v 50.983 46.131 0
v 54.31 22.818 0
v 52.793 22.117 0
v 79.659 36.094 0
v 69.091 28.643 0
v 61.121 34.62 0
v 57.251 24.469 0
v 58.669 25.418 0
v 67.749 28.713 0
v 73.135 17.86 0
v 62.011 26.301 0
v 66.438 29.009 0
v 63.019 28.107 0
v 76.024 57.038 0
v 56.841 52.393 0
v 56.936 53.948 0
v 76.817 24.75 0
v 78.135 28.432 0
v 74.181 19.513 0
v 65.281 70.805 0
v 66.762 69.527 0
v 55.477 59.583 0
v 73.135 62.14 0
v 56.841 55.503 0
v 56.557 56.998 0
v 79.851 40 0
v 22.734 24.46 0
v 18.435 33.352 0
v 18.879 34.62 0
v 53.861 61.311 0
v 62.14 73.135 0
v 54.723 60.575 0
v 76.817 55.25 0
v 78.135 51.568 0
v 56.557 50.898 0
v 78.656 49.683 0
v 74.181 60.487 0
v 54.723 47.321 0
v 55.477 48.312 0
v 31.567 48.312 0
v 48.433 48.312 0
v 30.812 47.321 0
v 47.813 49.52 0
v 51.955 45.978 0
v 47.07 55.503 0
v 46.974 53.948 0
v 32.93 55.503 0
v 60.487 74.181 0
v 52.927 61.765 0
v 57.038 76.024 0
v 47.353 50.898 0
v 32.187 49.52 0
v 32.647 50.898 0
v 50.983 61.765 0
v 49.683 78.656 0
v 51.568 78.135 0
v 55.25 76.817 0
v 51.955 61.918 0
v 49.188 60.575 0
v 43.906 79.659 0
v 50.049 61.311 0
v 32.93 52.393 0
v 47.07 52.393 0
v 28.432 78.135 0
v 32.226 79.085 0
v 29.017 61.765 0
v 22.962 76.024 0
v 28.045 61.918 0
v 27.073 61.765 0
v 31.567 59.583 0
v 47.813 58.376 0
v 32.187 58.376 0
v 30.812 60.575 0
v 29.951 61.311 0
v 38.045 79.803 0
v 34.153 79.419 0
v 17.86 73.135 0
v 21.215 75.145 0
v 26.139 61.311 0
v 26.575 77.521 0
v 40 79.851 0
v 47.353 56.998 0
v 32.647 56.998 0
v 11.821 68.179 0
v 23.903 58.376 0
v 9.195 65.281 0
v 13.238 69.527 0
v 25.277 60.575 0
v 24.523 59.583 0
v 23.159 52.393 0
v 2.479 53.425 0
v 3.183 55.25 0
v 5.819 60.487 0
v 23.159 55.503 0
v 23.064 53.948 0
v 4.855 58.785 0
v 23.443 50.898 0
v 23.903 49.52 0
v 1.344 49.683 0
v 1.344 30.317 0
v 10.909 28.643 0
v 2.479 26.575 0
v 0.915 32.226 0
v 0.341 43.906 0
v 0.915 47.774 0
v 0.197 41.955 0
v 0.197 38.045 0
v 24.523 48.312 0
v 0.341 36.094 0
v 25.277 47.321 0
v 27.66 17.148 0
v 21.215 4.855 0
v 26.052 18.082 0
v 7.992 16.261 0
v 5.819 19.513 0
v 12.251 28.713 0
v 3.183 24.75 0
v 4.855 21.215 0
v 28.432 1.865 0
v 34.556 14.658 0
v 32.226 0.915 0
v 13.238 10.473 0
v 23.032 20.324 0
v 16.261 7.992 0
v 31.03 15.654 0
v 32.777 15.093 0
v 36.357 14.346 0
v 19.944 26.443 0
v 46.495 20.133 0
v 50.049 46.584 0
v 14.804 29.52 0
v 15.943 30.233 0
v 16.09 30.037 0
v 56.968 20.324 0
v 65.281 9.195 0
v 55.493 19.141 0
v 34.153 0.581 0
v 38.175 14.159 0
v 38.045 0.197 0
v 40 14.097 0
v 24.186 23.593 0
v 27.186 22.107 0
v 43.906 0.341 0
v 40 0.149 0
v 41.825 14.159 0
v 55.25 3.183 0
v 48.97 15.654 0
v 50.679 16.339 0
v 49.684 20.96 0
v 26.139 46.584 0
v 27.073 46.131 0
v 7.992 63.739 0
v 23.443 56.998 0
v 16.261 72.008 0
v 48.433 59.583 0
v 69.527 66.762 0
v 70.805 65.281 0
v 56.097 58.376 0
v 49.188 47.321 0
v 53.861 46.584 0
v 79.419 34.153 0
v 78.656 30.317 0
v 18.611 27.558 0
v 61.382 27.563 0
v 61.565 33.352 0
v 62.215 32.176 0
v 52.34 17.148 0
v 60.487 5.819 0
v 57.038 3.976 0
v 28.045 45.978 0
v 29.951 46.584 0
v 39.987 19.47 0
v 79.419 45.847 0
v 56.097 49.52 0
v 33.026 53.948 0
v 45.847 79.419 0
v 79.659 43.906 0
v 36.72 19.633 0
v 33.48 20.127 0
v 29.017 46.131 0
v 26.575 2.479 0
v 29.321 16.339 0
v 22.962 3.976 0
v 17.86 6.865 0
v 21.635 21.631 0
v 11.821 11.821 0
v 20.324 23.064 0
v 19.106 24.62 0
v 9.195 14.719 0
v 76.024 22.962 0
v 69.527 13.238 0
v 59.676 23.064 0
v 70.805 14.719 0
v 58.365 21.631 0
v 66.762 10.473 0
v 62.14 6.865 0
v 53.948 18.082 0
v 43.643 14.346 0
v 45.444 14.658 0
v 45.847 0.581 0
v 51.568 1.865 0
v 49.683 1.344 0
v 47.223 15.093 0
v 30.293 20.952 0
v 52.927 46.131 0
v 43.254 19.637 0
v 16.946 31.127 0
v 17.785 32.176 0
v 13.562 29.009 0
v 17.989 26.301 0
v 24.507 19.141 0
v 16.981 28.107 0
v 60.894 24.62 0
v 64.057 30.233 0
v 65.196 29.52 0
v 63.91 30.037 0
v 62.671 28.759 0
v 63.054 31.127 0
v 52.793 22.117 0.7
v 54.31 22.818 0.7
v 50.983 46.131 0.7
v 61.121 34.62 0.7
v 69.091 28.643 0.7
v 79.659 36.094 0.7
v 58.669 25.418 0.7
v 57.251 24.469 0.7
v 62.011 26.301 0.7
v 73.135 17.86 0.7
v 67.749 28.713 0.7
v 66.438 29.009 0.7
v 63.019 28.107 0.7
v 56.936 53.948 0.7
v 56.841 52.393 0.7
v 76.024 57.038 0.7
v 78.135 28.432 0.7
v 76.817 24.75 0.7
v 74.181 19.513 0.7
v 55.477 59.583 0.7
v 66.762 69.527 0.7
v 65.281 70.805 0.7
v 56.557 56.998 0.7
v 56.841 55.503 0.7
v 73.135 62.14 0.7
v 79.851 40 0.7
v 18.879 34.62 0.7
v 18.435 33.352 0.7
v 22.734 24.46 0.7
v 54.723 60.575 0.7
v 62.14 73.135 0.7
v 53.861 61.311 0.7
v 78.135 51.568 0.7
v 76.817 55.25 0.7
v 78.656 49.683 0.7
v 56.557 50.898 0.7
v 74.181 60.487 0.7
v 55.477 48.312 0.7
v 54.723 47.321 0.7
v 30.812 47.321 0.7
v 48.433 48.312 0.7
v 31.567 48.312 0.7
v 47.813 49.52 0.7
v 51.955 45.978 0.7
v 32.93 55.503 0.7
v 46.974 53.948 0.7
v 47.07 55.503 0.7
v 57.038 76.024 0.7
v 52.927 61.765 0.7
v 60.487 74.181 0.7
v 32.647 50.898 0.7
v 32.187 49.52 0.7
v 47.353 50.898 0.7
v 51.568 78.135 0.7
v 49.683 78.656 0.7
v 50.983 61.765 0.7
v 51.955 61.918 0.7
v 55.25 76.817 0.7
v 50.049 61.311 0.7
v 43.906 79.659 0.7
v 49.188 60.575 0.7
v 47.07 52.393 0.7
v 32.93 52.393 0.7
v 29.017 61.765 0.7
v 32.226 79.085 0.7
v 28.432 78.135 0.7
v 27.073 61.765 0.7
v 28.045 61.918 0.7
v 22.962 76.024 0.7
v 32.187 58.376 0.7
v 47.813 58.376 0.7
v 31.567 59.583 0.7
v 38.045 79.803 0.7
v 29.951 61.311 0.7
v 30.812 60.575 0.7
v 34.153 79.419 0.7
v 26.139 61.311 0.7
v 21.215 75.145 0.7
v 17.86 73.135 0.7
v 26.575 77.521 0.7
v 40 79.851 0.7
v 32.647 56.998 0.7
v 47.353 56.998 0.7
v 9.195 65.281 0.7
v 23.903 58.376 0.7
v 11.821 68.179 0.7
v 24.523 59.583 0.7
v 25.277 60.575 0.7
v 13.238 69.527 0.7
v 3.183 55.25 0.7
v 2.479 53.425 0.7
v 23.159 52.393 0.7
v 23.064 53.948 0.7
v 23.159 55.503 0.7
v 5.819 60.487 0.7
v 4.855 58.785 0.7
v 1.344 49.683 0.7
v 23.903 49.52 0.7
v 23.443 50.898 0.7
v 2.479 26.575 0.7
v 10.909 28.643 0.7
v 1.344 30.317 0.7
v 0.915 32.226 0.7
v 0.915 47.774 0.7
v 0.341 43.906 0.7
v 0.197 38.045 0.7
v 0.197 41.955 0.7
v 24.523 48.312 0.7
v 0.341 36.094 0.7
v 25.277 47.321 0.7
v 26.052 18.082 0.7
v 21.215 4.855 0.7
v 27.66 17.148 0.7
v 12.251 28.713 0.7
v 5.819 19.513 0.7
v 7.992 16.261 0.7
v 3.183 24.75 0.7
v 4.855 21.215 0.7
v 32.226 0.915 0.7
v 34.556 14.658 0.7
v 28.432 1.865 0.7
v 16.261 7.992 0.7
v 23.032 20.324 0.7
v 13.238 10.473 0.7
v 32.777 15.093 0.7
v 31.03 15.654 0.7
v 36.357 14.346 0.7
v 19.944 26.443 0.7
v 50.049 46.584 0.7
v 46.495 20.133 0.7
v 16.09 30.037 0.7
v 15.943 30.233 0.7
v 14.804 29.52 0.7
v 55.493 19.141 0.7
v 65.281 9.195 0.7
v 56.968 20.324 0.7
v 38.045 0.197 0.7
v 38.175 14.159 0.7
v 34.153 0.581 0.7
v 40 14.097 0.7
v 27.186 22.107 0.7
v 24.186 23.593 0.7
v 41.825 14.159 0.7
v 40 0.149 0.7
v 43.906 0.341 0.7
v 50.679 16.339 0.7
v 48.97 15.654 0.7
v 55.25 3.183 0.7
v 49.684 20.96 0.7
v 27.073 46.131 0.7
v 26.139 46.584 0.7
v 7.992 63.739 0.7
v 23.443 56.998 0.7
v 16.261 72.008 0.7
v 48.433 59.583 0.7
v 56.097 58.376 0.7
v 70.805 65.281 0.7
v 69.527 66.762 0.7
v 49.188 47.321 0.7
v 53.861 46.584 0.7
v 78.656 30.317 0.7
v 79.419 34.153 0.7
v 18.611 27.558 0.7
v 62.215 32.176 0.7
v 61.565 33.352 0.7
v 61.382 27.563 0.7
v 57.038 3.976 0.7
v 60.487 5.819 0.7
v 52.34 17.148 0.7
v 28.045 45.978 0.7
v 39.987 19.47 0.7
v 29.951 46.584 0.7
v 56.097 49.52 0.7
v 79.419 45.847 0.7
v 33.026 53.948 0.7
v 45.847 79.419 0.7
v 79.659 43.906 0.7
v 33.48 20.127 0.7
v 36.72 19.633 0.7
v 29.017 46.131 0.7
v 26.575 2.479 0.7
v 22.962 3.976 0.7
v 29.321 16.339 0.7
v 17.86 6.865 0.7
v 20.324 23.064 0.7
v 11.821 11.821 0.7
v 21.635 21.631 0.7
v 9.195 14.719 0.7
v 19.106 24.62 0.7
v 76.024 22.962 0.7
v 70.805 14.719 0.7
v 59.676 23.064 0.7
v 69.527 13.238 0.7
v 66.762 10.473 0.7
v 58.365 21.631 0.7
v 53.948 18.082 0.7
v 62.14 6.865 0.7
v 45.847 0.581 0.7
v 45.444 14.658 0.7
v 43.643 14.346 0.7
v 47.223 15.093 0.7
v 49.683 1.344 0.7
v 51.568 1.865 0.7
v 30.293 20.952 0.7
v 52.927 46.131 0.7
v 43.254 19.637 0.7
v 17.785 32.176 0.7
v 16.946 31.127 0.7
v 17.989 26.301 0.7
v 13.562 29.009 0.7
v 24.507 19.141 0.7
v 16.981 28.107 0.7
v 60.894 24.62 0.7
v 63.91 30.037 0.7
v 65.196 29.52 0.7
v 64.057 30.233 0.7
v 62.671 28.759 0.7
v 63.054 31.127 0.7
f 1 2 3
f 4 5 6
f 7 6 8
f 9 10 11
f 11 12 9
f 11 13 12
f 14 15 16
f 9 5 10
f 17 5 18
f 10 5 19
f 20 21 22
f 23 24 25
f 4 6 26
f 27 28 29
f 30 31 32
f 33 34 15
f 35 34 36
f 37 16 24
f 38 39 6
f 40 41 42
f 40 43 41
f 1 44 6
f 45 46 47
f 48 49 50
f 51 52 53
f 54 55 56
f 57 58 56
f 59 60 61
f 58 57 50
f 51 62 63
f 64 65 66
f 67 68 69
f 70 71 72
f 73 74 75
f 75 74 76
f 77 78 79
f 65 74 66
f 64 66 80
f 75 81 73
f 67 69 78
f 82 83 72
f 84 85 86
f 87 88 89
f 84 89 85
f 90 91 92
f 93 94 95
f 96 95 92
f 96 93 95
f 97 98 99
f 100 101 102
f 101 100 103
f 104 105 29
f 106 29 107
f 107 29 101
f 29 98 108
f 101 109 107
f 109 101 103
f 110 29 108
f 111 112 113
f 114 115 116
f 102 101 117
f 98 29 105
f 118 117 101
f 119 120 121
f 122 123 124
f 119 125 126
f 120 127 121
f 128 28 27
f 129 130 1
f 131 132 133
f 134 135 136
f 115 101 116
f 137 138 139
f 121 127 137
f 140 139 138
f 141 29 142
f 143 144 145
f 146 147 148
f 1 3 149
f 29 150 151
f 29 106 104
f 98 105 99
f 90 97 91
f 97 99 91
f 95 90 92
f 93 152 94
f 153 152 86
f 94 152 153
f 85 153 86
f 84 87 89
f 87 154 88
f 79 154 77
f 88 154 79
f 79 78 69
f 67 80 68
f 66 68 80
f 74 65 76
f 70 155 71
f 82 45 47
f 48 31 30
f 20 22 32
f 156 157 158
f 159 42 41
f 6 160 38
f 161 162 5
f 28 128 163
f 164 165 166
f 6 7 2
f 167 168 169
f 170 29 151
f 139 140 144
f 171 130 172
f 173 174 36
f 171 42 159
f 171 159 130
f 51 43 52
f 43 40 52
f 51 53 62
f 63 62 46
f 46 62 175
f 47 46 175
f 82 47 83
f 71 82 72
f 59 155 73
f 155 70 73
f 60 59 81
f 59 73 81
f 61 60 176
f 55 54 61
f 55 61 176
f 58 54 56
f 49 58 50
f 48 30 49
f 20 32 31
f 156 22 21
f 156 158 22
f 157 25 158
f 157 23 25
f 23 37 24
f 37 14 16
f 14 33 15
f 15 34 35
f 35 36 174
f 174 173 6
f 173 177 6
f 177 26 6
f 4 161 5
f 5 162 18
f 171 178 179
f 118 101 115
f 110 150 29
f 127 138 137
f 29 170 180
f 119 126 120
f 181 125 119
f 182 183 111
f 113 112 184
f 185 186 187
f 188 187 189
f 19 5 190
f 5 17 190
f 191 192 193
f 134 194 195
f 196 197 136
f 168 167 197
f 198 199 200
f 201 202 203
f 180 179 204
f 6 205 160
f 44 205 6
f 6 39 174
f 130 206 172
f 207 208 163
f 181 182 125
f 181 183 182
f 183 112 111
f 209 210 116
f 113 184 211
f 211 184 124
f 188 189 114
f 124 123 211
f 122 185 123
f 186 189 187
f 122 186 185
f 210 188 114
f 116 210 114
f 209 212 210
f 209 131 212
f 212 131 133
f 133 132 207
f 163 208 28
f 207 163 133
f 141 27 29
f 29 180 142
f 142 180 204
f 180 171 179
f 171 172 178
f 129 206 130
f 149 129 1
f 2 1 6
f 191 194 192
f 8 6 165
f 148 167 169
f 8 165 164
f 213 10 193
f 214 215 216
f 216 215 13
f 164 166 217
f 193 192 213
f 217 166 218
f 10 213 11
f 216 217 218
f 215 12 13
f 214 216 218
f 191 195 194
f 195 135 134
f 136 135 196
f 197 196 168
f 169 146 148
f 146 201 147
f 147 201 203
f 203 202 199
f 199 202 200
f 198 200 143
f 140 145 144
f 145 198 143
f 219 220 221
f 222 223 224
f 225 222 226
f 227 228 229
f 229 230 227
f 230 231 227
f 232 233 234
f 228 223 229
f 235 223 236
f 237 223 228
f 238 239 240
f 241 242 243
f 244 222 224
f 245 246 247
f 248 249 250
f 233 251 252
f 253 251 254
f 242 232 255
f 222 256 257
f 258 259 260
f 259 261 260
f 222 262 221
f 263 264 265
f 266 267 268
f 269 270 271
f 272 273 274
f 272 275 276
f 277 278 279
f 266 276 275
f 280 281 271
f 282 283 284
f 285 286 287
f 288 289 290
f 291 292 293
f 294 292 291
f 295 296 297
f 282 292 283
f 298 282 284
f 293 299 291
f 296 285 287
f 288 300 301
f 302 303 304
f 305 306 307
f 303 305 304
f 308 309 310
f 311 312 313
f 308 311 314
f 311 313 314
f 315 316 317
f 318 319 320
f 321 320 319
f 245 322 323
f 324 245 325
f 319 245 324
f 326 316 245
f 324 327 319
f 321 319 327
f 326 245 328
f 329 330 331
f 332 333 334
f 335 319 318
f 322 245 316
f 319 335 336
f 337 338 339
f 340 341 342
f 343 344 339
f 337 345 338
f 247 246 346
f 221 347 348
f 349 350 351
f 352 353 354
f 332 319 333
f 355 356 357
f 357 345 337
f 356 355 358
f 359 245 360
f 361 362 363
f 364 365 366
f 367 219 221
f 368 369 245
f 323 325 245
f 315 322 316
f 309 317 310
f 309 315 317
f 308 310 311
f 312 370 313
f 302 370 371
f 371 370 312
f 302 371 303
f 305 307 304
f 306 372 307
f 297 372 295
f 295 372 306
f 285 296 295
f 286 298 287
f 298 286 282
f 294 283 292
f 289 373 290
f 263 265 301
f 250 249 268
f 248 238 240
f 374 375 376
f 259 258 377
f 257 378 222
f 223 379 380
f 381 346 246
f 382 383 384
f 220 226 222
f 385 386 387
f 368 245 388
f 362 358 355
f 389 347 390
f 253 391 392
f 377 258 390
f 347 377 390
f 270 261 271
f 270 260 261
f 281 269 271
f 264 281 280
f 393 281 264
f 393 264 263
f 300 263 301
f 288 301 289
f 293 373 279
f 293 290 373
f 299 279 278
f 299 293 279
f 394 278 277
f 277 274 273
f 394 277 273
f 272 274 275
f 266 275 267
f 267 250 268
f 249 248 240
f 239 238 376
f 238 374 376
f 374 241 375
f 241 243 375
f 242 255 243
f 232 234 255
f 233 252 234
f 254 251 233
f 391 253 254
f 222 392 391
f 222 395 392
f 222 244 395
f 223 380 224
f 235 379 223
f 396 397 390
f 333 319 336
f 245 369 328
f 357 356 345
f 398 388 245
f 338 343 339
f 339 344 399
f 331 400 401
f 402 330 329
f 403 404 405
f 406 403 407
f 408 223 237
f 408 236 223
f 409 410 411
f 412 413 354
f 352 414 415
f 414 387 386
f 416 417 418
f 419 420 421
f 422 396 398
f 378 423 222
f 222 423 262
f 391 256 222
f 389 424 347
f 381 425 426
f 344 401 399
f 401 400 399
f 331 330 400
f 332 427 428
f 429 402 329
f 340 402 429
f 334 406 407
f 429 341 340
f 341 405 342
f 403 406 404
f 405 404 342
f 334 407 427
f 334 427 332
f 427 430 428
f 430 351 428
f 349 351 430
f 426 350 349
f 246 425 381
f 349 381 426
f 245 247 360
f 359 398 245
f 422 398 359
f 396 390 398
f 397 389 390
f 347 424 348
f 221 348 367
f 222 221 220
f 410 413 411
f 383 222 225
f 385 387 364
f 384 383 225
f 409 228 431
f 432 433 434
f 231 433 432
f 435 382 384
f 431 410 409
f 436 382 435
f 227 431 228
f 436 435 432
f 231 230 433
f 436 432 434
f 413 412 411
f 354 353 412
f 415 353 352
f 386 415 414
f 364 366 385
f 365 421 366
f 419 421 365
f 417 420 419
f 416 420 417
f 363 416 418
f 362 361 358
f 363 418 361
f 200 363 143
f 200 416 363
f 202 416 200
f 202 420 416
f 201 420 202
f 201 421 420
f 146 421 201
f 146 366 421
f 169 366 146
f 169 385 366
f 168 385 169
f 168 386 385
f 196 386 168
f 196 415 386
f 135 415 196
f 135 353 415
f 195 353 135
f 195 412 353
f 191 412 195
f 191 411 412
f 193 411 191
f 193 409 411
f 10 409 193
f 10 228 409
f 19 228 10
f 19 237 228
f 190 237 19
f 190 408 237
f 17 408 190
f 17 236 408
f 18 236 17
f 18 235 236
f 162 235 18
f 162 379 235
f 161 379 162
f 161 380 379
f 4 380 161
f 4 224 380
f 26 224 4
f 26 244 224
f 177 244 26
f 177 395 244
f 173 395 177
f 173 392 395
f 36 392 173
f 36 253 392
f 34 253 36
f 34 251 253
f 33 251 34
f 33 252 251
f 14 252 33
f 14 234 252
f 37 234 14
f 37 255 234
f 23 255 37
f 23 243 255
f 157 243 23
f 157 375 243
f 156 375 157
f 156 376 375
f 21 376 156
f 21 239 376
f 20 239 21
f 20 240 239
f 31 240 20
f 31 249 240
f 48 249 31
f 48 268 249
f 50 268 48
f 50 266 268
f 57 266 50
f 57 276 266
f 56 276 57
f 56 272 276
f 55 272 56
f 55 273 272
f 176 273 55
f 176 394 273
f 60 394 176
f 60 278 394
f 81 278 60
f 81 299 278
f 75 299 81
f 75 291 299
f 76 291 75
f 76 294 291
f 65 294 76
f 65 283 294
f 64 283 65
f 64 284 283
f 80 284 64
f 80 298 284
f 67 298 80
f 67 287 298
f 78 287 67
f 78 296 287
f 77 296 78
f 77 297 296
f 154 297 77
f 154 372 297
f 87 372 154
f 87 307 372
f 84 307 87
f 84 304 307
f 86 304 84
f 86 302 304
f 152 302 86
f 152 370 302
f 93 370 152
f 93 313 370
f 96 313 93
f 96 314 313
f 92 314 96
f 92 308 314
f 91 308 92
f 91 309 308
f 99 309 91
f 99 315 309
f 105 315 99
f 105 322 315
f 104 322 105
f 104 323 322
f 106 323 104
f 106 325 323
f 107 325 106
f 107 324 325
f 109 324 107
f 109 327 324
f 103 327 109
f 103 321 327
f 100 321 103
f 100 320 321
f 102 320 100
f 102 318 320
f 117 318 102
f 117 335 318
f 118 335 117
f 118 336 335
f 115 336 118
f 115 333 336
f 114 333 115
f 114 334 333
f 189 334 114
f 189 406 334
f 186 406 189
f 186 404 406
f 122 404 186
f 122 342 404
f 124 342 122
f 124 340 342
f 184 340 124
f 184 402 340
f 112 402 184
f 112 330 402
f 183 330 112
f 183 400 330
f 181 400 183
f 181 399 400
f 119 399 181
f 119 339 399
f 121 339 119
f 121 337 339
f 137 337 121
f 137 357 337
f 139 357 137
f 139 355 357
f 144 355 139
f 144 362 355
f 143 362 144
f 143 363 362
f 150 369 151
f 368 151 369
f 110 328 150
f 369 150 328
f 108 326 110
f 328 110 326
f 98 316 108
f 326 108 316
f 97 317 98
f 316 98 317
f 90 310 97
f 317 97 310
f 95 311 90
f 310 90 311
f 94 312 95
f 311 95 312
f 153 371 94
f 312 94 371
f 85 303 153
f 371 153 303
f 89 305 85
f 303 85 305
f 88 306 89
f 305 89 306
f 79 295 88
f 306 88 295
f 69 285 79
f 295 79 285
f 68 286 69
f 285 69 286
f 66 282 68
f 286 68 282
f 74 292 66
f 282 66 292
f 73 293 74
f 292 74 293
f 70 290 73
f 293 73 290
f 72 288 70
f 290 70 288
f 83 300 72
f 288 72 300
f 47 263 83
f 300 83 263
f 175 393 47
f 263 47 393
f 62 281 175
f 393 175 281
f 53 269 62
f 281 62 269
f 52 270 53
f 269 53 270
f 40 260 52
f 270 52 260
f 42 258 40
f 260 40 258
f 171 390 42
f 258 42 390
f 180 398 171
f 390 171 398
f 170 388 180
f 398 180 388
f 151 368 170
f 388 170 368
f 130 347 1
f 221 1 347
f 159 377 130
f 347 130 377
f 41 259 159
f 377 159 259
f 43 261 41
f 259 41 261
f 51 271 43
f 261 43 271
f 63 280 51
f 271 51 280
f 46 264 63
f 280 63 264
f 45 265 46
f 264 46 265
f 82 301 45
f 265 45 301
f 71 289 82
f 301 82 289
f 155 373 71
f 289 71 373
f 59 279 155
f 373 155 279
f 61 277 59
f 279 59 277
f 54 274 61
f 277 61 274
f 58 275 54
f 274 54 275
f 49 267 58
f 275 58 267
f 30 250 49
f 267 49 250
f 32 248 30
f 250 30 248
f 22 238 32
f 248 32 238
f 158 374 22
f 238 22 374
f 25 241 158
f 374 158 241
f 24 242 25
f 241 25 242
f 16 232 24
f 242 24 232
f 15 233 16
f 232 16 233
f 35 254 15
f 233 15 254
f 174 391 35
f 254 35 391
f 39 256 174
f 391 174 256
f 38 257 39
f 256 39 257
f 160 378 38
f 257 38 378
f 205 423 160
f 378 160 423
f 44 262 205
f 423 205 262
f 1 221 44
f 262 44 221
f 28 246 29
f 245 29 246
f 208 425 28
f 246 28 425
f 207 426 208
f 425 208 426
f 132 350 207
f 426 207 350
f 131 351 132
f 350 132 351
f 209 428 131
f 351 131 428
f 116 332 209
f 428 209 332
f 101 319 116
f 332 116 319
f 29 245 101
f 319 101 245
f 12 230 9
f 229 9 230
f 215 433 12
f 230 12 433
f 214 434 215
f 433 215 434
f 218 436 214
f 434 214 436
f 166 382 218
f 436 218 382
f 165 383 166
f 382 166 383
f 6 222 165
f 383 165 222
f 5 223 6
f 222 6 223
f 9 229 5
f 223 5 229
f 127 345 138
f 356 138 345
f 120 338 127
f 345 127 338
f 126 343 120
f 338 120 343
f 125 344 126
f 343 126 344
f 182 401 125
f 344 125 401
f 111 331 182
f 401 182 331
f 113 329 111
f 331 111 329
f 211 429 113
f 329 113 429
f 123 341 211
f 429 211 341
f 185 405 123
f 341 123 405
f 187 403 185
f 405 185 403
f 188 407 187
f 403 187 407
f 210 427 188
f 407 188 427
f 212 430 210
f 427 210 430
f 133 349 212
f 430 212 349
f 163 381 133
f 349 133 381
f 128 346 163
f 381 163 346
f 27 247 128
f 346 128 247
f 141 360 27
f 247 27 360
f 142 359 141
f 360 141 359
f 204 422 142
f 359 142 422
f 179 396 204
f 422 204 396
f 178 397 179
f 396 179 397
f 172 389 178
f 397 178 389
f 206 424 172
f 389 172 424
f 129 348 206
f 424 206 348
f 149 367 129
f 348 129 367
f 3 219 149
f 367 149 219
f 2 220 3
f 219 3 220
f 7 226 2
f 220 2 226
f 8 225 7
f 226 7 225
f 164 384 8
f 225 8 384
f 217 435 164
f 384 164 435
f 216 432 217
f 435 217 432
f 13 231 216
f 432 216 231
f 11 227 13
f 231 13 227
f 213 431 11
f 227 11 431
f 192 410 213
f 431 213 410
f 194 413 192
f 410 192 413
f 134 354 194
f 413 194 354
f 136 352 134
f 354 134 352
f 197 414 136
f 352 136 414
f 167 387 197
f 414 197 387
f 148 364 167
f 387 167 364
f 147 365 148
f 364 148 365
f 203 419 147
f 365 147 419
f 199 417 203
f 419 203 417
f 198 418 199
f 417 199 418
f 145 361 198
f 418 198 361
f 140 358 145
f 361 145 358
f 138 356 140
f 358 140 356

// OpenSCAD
stencilHeight = 0.7;
faceSize = 79.65;

module dummy() {}

center_svg_1 = [40.024005174,20.074725186];
center_svg_2 = [40.024005174,20.074725186];
center_svg_3 = [16.089666030,22.067256511];
center_svg_4 = [10.909088961,28.642594902];
center_svg_5 = [65.105854732,28.642594902];
center_svg_6 = [28.044831080,49.962646142];
center_svg_7 = [46.973848537,49.962646142];
// paths for svg_1
points_svg_1_1 = [ [39.826560043,19.925280190],[39.634668564,16.019242346],[39.395237704,14.077988729],[38.632288402,10.242384127],[38.110607972,8.357273448],[36.793116393,4.675131375],[36.000479198,2.886970583],[34.156965054,-0.562001713],[33.110529292,-2.214504343],[30.780899091,-5.355647037],[29.503316935,-6.836719816],[26.738000130,-9.602036664],[25.256927371,-10.879618844],[22.115784712,-13.209249093],[20.463282099,-14.255684881],[17.014309832,-16.099199079],[15.226149052,-16.891836302],[11.544007000,-18.209327938],[9.658896329,-18.731008397],[5.823291739,-19.493957759],[3.882038126,-19.733388650],[-0.023999798,-19.925280190],[-1.979374146,-19.877278445],[-5.871291517,-19.493958051],[-7.798458572,-19.159562854],[-11.592007035,-18.209328457],[-13.449249453,-17.595778454],[-17.062310144,-16.099199757],[-18.809424238,-15.219776452],[-22.163785307,-13.209249863],[-23.762951334,-12.082990114],[-26.786001000,-9.602037459],[-28.202601847,-8.253321386],[-30.828900215,-5.355647797],[-32.032270754,-3.813671029],[-34.204966399,-0.562002383],[-35.169057293,1.139855941],[-36.841117919,4.675130840],[-37.545059512,6.500030629],[-38.680290057,10.242383760],[-39.108844141,12.150821447],[-39.682670294,16.019242171],[-39.826559966,17.969905844],[-39.826560043,21.880654587],[-39.682670442,23.831318317],[-39.108844416,27.699739161],[-38.680290388,29.608176912],[-37.545059936,33.350530177],[-36.841118382,35.175430034],[-35.169057815,38.710705073],[-34.204966943,40.412563467],[-32.032271324,43.664232252],[-30.828900790,45.206209087],[-28.202602417,48.103882808],[-26.786001560,49.452598943],[-23.762951861,51.933551715],[-22.163785810,53.059811519],[-18.809424682,55.070338206],[-17.062310554,55.949761555],[-13.449249785,57.446340327],[-11.592007325,58.059890361],[-7.798458770,59.010124807],[-5.871291667,59.344520021],[-1.979374196,59.727840434],[-0.023999798,59.775842181],[3.882038184,59.583950635],[5.823291847,59.344519735],[9.658896533,58.581570338],[11.544007249,58.059889854],[15.226149386,56.742398156],[17.014310204,55.949760894],[20.463282539,54.106246609],[22.115785180,53.059810772],[25.256927884,50.730180414],[26.738000659,49.452598176],[29.503317482,46.687281204],[30.780899640,45.206208360],[33.110529829,42.065065531],[34.156965576,40.412562833],[36.000479675,36.963590398],[36.793116840,35.175429538],[38.110608340,31.493287330],[38.632288722,29.608176586],[39.395237912,25.772571859],[39.634668708,23.831318183],[39.826560043,19.925280190] ];

// paths for svg_2
points_svg_2_1 = [ [39.826560043,19.925280190],[39.634668564,16.019242346],[39.395237704,14.077988729],[38.632288402,10.242384127],[38.110607972,8.357273448],[36.793116393,4.675131375],[36.000479198,2.886970583],[34.156965054,-0.562001713],[33.110529292,-2.214504343],[30.780899091,-5.355647037],[29.503316935,-6.836719816],[26.738000130,-9.602036664],[25.256927371,-10.879618844],[22.115784712,-13.209249093],[20.463282099,-14.255684881],[17.014309832,-16.099199079],[15.226149052,-16.891836302],[11.544007000,-18.209327938],[9.658896329,-18.731008397],[5.823291739,-19.493957759],[3.882038126,-19.733388650],[-0.023999798,-19.925280190],[-1.979374146,-19.877278445],[-5.871291517,-19.493958051],[-7.798458572,-19.159562854],[-11.592007035,-18.209328457],[-13.449249453,-17.595778454],[-17.062310144,-16.099199757],[-18.809424238,-15.219776452],[-22.163785307,-13.209249863],[-23.762951334,-12.082990114],[-26.786001000,-9.602037459],[-28.202601847,-8.253321386],[-30.828900215,-5.355647797],[-32.032270754,-3.813671029],[-34.204966399,-0.562002383],[-35.169057293,1.139855941],[-36.841117919,4.675130840],[-37.545059512,6.500030629],[-38.680290057,10.242383760],[-39.108844141,12.150821447],[-39.682670294,16.019242171],[-39.826559966,17.969905844],[-39.826560043,21.880654587],[-39.682670442,23.831318317],[-39.108844416,27.699739161],[-38.680290388,29.608176912],[-37.545059936,33.350530177],[-36.841118382,35.175430034],[-35.169057815,38.710705073],[-34.204966943,40.412563467],[-32.032271324,43.664232252],[-30.828900790,45.206209087],[-28.202602417,48.103882808],[-26.786001560,49.452598943],[-23.762951861,51.933551715],[-22.163785810,53.059811519],[-18.809424682,55.070338206],[-17.062310554,55.949761555],[-13.449249785,57.446340327],[-11.592007325,58.059890361],[-7.798458770,59.010124807],[-5.871291667,59.344520021],[-1.979374196,59.727840434],[-0.023999798,59.775842181],[3.882038184,59.583950635],[5.823291847,59.344519735],[9.658896533,58.581570338],[11.544007249,58.059889854],[15.226149386,56.742398156],[17.014310204,55.949760894],[20.463282539,54.106246609],[22.115785180,53.059810772],[25.256927884,50.730180414],[26.738000659,49.452598176],[29.503317482,46.687281204],[30.780899640,45.206208360],[33.110529829,42.065065531],[34.156965576,40.412562833],[36.000479675,36.963590398],[36.793116840,35.175429538],[38.110608340,31.493287330],[38.632288722,29.608176586],[39.395237912,25.772571859],[39.634668708,23.831318183],[39.826560043,19.925280190] ];

// paths for svg_3
points_svg_3_1 = [ [0.000000000,7.970111054],[2.521744117,5.490731630],[3.854017159,4.375283453],[6.644796733,2.392776182],[8.096675874,1.525679493],[11.096844386,0.039706020],[14.203468567,-1.115432896],[17.390038853,-1.939887635],[20.630045680,-2.433808577],[23.896979483,-2.597346103],[27.164330698,-2.430650593],[30.405589760,-1.933872427],[33.594247104,-1.107161985],[36.703793167,0.049330352],[38.220615229,0.751197738],[41.161788937,2.402080956],[42.579513191,3.351059193],[45.292668023,5.495994936],[46.581471209,6.691914847],[47.820673315,7.970111054],[46.929483891,6.039849783],[45.921544798,4.234121498],[44.804639350,2.552926197],[43.586550856,0.996263882],[42.275062627,-0.435865448],[40.877957976,-1.743461793],[39.403020213,-2.926525153],[37.858032649,-3.985055527],[36.250778596,-4.919052916],[34.589041364,-5.728517320],[32.880604266,-6.413448739],[31.133250611,-6.973847173],[29.354763712,-7.409712621],[27.552926879,-7.721045084],[25.735523424,-7.907844562],[23.910336658,-7.970111054],[22.085149891,-7.907844562],[20.267746436,-7.721045084],[18.465909603,-7.409712621],[16.687422704,-6.973847173],[14.940069049,-6.413448739],[13.231631951,-5.728517320],[11.569894719,-4.919052916],[9.962640666,-3.985055527],[8.417653102,-2.926525153],[6.942715339,-1.743461793],[5.545610688,-0.435865448],[4.234122459,0.996263882],[3.016033965,2.552926197],[1.899128517,4.234121498],[0.891189424,6.039849783],[0.000000000,7.970111054] ];

// paths for svg_4
points_svg_4_1 = [ [7.970112613,5.977584460],[7.526398179,4.709342112],[6.875946235,3.533657877],[6.037242689,2.483944814],[5.034123576,1.590035871],[3.895097639,0.877336027],[2.652536106,0.366100280],[1.341752696,0.070857999],[0.000000000,0.000000000] ];

// paths for svg_5
points_svg_5_1 = [ [-3.985056307,5.977584460],[-3.541341872,4.709342112],[-2.890889929,3.533657877],[-2.052186382,2.483944814],[-1.049067269,1.590035871],[0.089958668,0.877336027],[1.332520201,0.366100280],[2.643303611,0.070857999],[3.985056307,0.000000000] ];

// paths for svg_6
points_svg_6_1 = [ [4.981320383,3.985056307],[4.885605709,2.430164470],[4.602139947,0.935026255],[4.141816528,-0.442901015],[3.522325422,-1.650664369],[2.767473326,-2.641850138],[1.906268782,-3.378367609],[0.971807398,-3.831912828],[0.000000000,-3.985056307],[-0.971807398,-3.831912828],[-1.906268782,-3.378367609],[-2.767473326,-2.641850138],[-3.522325422,-1.650664369],[-4.141816528,-0.442901015],[-4.602139947,0.935026255],[-4.885605709,2.430164470],[-4.981320383,3.985056307],[-4.885605709,5.539948143],[-4.602139947,7.035086358],[-4.141816528,8.413013629],[-3.522325422,9.620776982],[-2.767473326,10.611962751],[-1.906268782,11.348480222],[-0.971807398,11.802025441],[0.000000000,11.955168920],[0.971807398,11.802025441],[1.906268782,11.348480222],[2.767473326,10.611962751],[3.522325422,9.620776982],[4.141816528,8.413013629],[4.602139947,7.035086358],[4.885605709,5.539948143],[4.981320383,3.985056307] ];

// paths for svg_7
points_svg_7_1 = [ [0.000000000,3.985056307],[0.095714674,2.430164470],[0.379180436,0.935026255],[0.839503855,-0.442901015],[1.458994961,-1.650664369],[2.213847057,-2.641850138],[3.075051601,-3.378367609],[4.009512986,-3.831912828],[4.981320383,-3.985056307],[5.953127781,-3.831912828],[6.887589165,-3.378367609],[7.748793709,-2.641850138],[8.503645806,-1.650664369],[9.123136911,-0.442901015],[9.583460330,0.935026255],[9.866926092,2.430164470],[9.962640767,3.985056307],[9.866926092,5.539948143],[9.583460330,7.035086358],[9.123136911,8.413013629],[8.503645806,9.620776982],[7.748793709,10.611962751],[6.887589165,11.348480222],[5.953127781,11.802025441],[4.981320383,11.955168920],[4.009512986,11.802025441],[3.075051601,11.348480222],[2.213847057,10.611962751],[1.458994961,9.620776982],[0.839503855,8.413013629],[0.379180436,7.035086358],[0.095714674,5.539948143],[0.000000000,3.985056307] ];

module polygon_svg_1() {
 {
  polygon(points=points_svg_1_1);
 }
}

module polygon_svg_2() {
 {
  polygon(points=points_svg_2_1);
 }
}

module polygon_svg_3() {
 {
  polygon(points=points_svg_3_1);
 }
}

module polygon_svg_4() {
 {
  polygon(points=points_svg_4_1);
 }
}

module polygon_svg_5() {
 {
  polygon(points=points_svg_5_1);
 }
}

module polygon_svg_6() {
 {
  polygon(points=points_svg_6_1);
 }
}

module polygon_svg_7() {
 {
  polygon(points=points_svg_7_1);
 }
}

linear_extrude(height=stencilHeight)
scale(faceSize/79.65)
difference() {
translate(center_svg_2) polygon_svg_2();
translate(center_svg_3) polygon_svg_3();
translate(center_svg_4) polygon_svg_4();
translate(center_svg_5) polygon_svg_5();
translate(center_svg_6) polygon_svg_6();
translate(center_svg_7) polygon_svg_7();
}
